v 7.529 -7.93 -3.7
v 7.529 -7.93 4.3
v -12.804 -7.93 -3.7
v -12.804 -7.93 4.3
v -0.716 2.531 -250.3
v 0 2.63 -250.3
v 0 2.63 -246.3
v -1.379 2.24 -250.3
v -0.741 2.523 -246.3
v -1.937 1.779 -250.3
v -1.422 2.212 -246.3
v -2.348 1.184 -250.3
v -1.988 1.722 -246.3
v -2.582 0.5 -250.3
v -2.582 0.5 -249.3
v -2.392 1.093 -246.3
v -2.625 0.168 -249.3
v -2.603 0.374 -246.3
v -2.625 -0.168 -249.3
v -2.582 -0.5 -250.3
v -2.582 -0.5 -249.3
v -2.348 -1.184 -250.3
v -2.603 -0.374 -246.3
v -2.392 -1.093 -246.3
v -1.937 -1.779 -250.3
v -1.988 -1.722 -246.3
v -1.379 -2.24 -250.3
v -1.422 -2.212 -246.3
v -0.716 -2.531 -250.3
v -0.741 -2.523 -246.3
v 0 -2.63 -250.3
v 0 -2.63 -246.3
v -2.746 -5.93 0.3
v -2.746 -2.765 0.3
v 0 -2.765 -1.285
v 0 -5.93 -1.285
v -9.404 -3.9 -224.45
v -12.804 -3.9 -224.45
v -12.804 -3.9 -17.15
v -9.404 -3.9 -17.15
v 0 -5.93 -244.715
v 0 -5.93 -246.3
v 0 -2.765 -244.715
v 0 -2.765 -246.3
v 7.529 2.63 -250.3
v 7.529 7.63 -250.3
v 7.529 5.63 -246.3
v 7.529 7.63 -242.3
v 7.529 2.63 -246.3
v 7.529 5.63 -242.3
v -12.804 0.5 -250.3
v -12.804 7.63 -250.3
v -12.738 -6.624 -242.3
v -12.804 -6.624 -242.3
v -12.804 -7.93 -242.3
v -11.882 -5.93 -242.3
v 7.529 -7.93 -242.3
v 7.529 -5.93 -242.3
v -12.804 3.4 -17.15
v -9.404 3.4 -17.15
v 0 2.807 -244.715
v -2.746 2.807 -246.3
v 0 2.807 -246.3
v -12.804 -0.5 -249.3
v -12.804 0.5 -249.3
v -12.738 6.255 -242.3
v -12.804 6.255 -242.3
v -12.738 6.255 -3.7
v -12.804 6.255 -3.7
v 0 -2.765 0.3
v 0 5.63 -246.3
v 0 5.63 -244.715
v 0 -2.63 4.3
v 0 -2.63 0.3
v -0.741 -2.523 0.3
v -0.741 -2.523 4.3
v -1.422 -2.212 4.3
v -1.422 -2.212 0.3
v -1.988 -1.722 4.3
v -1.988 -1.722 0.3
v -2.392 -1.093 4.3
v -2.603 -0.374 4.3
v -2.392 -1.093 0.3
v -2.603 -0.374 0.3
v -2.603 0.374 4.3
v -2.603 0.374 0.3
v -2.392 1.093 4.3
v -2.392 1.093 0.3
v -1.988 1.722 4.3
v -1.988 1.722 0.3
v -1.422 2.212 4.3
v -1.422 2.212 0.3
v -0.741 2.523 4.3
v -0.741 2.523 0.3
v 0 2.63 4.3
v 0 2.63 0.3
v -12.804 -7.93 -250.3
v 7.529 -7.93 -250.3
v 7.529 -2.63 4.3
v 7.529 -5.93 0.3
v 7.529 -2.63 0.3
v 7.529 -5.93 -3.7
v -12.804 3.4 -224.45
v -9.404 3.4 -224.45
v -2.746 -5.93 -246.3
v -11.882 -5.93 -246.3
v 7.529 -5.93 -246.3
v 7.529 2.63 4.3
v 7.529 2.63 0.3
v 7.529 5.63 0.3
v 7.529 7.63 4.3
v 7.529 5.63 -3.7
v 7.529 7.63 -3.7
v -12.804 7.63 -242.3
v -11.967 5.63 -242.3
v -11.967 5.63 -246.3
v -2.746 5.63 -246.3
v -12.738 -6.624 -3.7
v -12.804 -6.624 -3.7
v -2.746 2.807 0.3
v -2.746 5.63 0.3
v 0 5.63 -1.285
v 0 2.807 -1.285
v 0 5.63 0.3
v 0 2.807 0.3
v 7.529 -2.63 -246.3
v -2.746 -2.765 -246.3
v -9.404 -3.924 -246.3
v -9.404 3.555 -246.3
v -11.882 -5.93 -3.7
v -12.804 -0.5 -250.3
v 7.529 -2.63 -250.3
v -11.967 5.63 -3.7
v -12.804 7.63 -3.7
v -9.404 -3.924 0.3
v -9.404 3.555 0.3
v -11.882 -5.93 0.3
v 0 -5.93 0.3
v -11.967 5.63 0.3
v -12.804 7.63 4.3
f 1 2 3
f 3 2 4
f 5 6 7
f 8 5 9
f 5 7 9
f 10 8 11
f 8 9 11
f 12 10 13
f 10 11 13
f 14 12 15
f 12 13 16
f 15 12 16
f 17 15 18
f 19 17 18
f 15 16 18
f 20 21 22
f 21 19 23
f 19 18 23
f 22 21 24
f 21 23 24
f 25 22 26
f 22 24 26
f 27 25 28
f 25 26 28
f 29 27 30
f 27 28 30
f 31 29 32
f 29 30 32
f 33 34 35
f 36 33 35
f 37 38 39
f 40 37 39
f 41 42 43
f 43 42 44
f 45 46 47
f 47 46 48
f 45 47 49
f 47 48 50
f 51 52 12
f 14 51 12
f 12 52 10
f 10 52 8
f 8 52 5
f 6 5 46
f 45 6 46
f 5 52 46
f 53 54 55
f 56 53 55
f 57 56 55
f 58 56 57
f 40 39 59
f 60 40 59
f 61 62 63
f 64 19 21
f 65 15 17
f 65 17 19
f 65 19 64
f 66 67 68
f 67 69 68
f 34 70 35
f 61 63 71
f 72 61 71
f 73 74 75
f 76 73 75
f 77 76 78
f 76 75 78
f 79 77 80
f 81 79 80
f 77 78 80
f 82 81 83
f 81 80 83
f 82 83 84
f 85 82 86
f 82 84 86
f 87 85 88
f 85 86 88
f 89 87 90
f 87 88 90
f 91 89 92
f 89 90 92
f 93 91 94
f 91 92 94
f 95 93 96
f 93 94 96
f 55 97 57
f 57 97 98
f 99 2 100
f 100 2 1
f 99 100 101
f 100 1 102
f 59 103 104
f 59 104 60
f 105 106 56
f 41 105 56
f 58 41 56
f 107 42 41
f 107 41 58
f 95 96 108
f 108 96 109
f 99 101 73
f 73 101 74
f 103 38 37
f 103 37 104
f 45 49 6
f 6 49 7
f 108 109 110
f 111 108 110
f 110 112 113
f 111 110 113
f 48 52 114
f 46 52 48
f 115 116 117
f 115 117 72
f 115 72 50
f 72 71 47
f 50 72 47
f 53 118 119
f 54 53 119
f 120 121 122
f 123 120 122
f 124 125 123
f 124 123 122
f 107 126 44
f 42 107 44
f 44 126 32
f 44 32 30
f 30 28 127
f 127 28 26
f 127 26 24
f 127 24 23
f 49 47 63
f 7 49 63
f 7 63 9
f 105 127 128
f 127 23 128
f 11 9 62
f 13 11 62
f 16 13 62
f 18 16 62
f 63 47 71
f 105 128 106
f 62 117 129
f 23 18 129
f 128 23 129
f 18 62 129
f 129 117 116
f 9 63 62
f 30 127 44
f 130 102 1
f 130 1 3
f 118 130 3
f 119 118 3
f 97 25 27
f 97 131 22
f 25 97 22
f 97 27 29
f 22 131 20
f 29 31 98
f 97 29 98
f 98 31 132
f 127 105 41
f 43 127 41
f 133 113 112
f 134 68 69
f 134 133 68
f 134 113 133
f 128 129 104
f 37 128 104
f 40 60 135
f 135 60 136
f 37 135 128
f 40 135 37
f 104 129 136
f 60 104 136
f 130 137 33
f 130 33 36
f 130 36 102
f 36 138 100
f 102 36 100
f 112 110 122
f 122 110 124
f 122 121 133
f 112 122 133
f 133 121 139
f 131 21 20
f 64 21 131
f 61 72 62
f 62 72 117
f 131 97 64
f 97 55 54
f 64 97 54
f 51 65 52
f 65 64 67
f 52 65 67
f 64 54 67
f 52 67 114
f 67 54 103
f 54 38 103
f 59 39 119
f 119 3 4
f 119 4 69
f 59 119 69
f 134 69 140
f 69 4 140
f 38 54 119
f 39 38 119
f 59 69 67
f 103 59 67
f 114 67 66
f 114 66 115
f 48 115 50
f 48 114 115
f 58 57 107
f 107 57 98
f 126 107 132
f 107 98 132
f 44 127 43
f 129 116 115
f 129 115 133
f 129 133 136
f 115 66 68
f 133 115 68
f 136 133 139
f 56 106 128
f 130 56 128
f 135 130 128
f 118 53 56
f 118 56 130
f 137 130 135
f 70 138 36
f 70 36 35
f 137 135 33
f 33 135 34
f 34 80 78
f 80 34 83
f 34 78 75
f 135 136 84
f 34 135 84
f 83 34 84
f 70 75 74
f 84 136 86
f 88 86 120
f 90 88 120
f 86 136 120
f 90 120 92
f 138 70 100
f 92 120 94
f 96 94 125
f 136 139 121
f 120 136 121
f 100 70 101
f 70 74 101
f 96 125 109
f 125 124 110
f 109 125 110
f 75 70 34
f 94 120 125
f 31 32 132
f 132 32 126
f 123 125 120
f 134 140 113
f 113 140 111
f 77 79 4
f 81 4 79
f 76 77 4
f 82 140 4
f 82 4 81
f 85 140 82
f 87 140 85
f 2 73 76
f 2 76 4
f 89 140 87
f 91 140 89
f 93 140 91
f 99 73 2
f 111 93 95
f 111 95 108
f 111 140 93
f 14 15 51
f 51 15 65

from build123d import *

# Parameters (mm, degrees)
EXTRUDE_START              = 0.3
EXTRUDE_1_DEPTH            = 4
EXTRUDE_2_DEPTH            = 4
SKETCH_3_W                 = 254.6
SKETCH_3_H                 = 12.878514778
EXTRUDE_3_DEPTH            = 3.4
CUT_EXTRUDE_1_REACH        = 253.212
SKETCH_4_W                 = 207.3
SKETCH_4_H                 = 7.3
SKETCH_5_W                 = 2.745808793
SKETCH_5_H                 = 3.85924733
SKETCH_5_H_2               = 3.447603815
EXTRUDE_4_DEPTH            = 2
SKETCH_6_W                 = 2.745808793
SKETCH_6_H                 = 3.85924733
SKETCH_6_H_2               = 3.447603815
EXTRUDE_5_DEPTH            = 2
CHAMFER_1_SIZE             = 3.464101615
CHAMFER_1_SIZE_2           = 2
CHAMFER_2_SIZE             = 2.7
CHAMFER_2_SIZE2            = 3.334222323
EXTRUDE_START_2            = -4
SKETCH_7_W                 = 20.333516096
SKETCH_7_H                 = 2
EXTRUDE_6_DEPTH            = 8
EXTRUDE_7_DEPTH            = 4
EXTRUDE_7_DEPTH_BACK       = 4
CUT_EXTRUDE_1_2_DEPTH      = 256.045082384
CUT_EXTRUDE_1_2_DEPTH_BACK = 1
SKETCH_9_W                 = 12.804262888
SKETCH_9_H                 = 1


with BuildPart() as part:
    # 草图1 → 凸台-拉伸1 (new body)
    with BuildSketch(Plane.XY.offset(EXTRUDE_START)):
        with BuildLine():
            Line((7.529253208, 6.254669476), (-12.804262888, 6.254669476))
            Line((-12.804262888, 6.254669476), (-12.804262888, -6.623845302))
            Line((-12.804262888, -6.623845302), (7.529253208, -6.623845302))
            Line((7.529253208, -6.623845302), (7.529253208, -2.63))
            Line((7.529253208, -2.63), (0, -2.63))
            ThreePointArc((0, -2.63), (-2.63, 0), (0, 2.63))
            Line((0, 2.63), (7.529253208, 2.63))
            Line((7.529253208, 2.63), (7.529253208, 6.254669476))
        make_face()
    extrude(amount=EXTRUDE_1_DEPTH)



with BuildPart() as body_2:
    # 草图2 → 凸台-拉伸2 (new body)
    with BuildSketch(Plane(origin=(0, 0, -246.3), x_dir=(-1, 0, 0), z_dir=(0, 0, -1))):
        with BuildLine():
            Line((-7.529253208, 6.254669476), (-7.529253208, 2.63))
            Line((-7.529253208, 2.63), (0, 2.63))
            ThreePointArc((0, 2.63), (2.63, 0), (0, -2.63))
            Line((0, -2.63), (-7.529253208, -2.63))
            Line((-7.529253208, -2.63), (-7.529253208, -6.623845302))
            Line((-7.529253208, -6.623845302), (12.804262888, -6.623845302))
            Line((12.804262888, -6.623845302), (12.804262888, 6.254669476))
            Line((12.804262888, 6.254669476), (-7.529253208, 6.254669476))
        make_face()
    extrude(amount=EXTRUDE_2_DEPTH)


with BuildPart() as part_1:
    add(part.part)

    add(body_2.part)  # 凸台-拉伸3 merges body 2
    # 草图3 → 凸台-拉伸3 (add)
    with BuildSketch(Plane.ZY.offset(12.804262888)):
        with Locations((-123, -0.184587913)):
            Rectangle(SKETCH_3_W, SKETCH_3_H)
    extrude(amount=-EXTRUDE_3_DEPTH)

    # 草图4 → Cut-Extrude 1 (cut, up to next)
    with BuildSketch(Plane.ZY.offset(12.804262888), mode=Mode.PRIVATE) as cut_extrude_1_sk1:
        with Locations((-120.8, -0.25)):
            Rectangle(SKETCH_4_W, SKETCH_4_H)
    cut_extrude_1_tool1 = extrude(cut_extrude_1_sk1.sketch, amount=-CUT_EXTRUDE_1_REACH, mode=Mode.PRIVATE) & part_1.part
    add(cut_extrude_1_tool1.solids().sort_by_distance((-12.804263, -0.25, -120.8))[0], mode=Mode.SUBTRACT)

    # 草图5 → 凸台-拉伸4 (add)
    with BuildSketch(Plane.XY.offset(-246.3)):
        with Locations((-1.372904397, -4.694221637)):
            Rectangle(SKETCH_5_W, SKETCH_5_H)
        with Locations((-1.372904397, 4.530867568)):
            Rectangle(SKETCH_5_W, SKETCH_5_H_2)
    extrude(amount=EXTRUDE_4_DEPTH)

    # 草图6 → 凸台-拉伸5 (add)
    with BuildSketch(Plane(origin=(0, 0, 0.3), x_dir=(-1, 0, 0), z_dir=(0, 0, -1))):
        with Locations((1.372904397, -4.694221637)):
            Rectangle(SKETCH_6_W, SKETCH_6_H)
        with Locations((1.372904397, 4.530867568)):
            Rectangle(SKETCH_6_W, SKETCH_6_H_2)
    extrude(amount=EXTRUDE_5_DEPTH)

    # 倒角1
    # the kernel refuses this chamfer: 3.464101615, 2 mm, written as the material it takes off along each edge
    with BuildSketch(Plane(origin=(-2.745808793, 15.216597417, -244.3), x_dir=(0.9998132206222079, 0, 0.01932676561270368), z_dir=(0, -1, 0))) as chamfer_1_piece_1_section:
        Polygon((CHAMFER_1_SIZE * 0.999813220662, -CHAMFER_1_SIZE * 0.0193267656135), (-CHAMFER_1_SIZE_2 * 0.0193267656127, -CHAMFER_1_SIZE_2 * 0.999813220622), (0, 0), align=None)
    chamfer_1_piece_1 = extrude(amount=21.371459697, mode=Mode.PRIVATE)
    chamfer_1_piece_1 = split(chamfer_1_piece_1, bisect_by=Plane(origin=(-1.581226814, 4.530867568, -246.3), z_dir=(0, 0, 1)), keep=Keep.TOP, mode=Mode.PRIVATE)
    add(chamfer_1_piece_1, mode=Mode.SUBTRACT)
    with BuildSketch(Plane(origin=(-2.745808793, -15.585773243, -244.3), x_dir=(-0.057893862402670956, 0, -0.9983227437537926), z_dir=(0, 1, 0))) as chamfer_1_piece_2_section:
        Polygon((CHAMFER_1_SIZE_2 * 0.998322743754, -CHAMFER_1_SIZE_2 * 0.0578938624027), (-CHAMFER_1_SIZE * 0.057893862405, -CHAMFER_1_SIZE * 0.998322743793), (0, 0), align=None)
    chamfer_1_piece_2 = extrude(amount=21.783103212, mode=Mode.PRIVATE)
    chamfer_1_piece_2 = split(chamfer_1_piece_2, bisect_by=Plane(origin=(-1.581226814, -4.694221637, -246.3), z_dir=(0, 0, 1)), keep=Keep.TOP, mode=Mode.PRIVATE)
    add(chamfer_1_piece_2, mode=Mode.SUBTRACT)
    with BuildSketch(Plane(origin=(-2.745808793, 6.197329969, -1.7), x_dir=(-0.057893862402671255, 0, 0.9983227437537926), z_dir=(0, -1, 0))) as chamfer_1_piece_3_section:
        Polygon((CHAMFER_1_SIZE_2 * 0.998322743754, -CHAMFER_1_SIZE_2 * 0.0578938624027), (-CHAMFER_1_SIZE * 0.057893862405, -CHAMFER_1_SIZE * 0.998322743793), (0, 0), align=None)
    chamfer_1_piece_3 = extrude(amount=21.783103212, mode=Mode.PRIVATE)
    chamfer_1_piece_3 = split(chamfer_1_piece_3, bisect_by=Plane(origin=(-1.581226814, -4.694221637, 0.3), z_dir=(0, 0, -1)), keep=Keep.TOP, mode=Mode.PRIVATE)
    add(chamfer_1_piece_3, mode=Mode.SUBTRACT)
    with BuildSketch(Plane(origin=(-2.745808793, 15.216597417, -1.7), x_dir=(-0.057893862402671255, 0, 0.9983227437537926), z_dir=(0, -1, 0))) as chamfer_1_piece_4_section:
        Polygon((CHAMFER_1_SIZE_2 * 0.998322743754, -CHAMFER_1_SIZE_2 * 0.0578938624027), (-CHAMFER_1_SIZE * 0.057893862405, -CHAMFER_1_SIZE * 0.998322743793), (0, 0), align=None)
    chamfer_1_piece_4 = extrude(amount=21.371459697, mode=Mode.PRIVATE)
    chamfer_1_piece_4 = split(chamfer_1_piece_4, bisect_by=Plane(origin=(-1.581226814, 4.530867568, 0.3), z_dir=(0, 0, -1)), keep=Keep.TOP, mode=Mode.PRIVATE)
    add(chamfer_1_piece_4, mode=Mode.SUBTRACT)

    # 倒角2
    chamfer_2_edges = [part_1.edges().sort_by_distance(p)[0] for p in [
        (-9.404262888, 6.254669476, -123),
        (-9.404262888, -6.623845302, -123),
    ]]
    chamfer_2_side = [part_1.faces().sort_by_distance(p)[0] for p in [
        (-9.404262888, -4.154484734, -123),
    ]]
    chamfer(chamfer_2_edges, length=CHAMFER_2_SIZE, length2=CHAMFER_2_SIZE2, reference=chamfer_2_side[0])

    # 草图7 → 凸台-拉伸6 (add)
    with BuildSketch(Plane.XY.offset(-246.3).offset(EXTRUDE_START_2)):
        with Locations((-2.63750484, -6.93)):
            Rectangle(SKETCH_7_W, SKETCH_7_H)
        with Locations((-2.63750484, 6.63)):
            Rectangle(SKETCH_7_W, SKETCH_7_H)
    extrude(amount=EXTRUDE_6_DEPTH)

    # 草图8 → 凸台-拉伸7 (add, two sides: drawn at the far end of the back side and taken through both)
    with BuildSketch(Plane(origin=(0, 0, 0.3), x_dir=(-1, 0, 0), z_dir=(0, 0, -1)).offset(-EXTRUDE_7_DEPTH_BACK)):
        Polygon((12.738485211, -6.623845302), (11.88165762, -5.93), (-7.529253208, -5.93), (-7.529253208, -7.93), (12.804262888, -7.93), (12.804262888, -6.623845302), align=None)
        Polygon((12.738485211, 6.254669476), (12.804262888, 6.254669476), (12.804262888, 7.63), (-7.529253208, 7.63), (-7.529253208, 5.63), (11.967082651, 5.63), align=None)
    extrude(amount=EXTRUDE_7_DEPTH + EXTRUDE_7_DEPTH_BACK)

    # 草图9 → Cut-Extrude 1 2 (cut, two sides: drawn at the far end of the back side and taken through both)
    with BuildSketch(Plane(origin=(0, 0, -250.3), x_dir=(-1, 0, 0), z_dir=(0, 0, -1)).offset(-CUT_EXTRUDE_1_2_DEPTH_BACK)):
        with Locations((6.402131444, 0)):
            Rectangle(SKETCH_9_W, SKETCH_9_H)
    extrude(amount=CUT_EXTRUDE_1_2_DEPTH + CUT_EXTRUDE_1_2_DEPTH_BACK, mode=Mode.SUBTRACT)


solid = part_1.part
